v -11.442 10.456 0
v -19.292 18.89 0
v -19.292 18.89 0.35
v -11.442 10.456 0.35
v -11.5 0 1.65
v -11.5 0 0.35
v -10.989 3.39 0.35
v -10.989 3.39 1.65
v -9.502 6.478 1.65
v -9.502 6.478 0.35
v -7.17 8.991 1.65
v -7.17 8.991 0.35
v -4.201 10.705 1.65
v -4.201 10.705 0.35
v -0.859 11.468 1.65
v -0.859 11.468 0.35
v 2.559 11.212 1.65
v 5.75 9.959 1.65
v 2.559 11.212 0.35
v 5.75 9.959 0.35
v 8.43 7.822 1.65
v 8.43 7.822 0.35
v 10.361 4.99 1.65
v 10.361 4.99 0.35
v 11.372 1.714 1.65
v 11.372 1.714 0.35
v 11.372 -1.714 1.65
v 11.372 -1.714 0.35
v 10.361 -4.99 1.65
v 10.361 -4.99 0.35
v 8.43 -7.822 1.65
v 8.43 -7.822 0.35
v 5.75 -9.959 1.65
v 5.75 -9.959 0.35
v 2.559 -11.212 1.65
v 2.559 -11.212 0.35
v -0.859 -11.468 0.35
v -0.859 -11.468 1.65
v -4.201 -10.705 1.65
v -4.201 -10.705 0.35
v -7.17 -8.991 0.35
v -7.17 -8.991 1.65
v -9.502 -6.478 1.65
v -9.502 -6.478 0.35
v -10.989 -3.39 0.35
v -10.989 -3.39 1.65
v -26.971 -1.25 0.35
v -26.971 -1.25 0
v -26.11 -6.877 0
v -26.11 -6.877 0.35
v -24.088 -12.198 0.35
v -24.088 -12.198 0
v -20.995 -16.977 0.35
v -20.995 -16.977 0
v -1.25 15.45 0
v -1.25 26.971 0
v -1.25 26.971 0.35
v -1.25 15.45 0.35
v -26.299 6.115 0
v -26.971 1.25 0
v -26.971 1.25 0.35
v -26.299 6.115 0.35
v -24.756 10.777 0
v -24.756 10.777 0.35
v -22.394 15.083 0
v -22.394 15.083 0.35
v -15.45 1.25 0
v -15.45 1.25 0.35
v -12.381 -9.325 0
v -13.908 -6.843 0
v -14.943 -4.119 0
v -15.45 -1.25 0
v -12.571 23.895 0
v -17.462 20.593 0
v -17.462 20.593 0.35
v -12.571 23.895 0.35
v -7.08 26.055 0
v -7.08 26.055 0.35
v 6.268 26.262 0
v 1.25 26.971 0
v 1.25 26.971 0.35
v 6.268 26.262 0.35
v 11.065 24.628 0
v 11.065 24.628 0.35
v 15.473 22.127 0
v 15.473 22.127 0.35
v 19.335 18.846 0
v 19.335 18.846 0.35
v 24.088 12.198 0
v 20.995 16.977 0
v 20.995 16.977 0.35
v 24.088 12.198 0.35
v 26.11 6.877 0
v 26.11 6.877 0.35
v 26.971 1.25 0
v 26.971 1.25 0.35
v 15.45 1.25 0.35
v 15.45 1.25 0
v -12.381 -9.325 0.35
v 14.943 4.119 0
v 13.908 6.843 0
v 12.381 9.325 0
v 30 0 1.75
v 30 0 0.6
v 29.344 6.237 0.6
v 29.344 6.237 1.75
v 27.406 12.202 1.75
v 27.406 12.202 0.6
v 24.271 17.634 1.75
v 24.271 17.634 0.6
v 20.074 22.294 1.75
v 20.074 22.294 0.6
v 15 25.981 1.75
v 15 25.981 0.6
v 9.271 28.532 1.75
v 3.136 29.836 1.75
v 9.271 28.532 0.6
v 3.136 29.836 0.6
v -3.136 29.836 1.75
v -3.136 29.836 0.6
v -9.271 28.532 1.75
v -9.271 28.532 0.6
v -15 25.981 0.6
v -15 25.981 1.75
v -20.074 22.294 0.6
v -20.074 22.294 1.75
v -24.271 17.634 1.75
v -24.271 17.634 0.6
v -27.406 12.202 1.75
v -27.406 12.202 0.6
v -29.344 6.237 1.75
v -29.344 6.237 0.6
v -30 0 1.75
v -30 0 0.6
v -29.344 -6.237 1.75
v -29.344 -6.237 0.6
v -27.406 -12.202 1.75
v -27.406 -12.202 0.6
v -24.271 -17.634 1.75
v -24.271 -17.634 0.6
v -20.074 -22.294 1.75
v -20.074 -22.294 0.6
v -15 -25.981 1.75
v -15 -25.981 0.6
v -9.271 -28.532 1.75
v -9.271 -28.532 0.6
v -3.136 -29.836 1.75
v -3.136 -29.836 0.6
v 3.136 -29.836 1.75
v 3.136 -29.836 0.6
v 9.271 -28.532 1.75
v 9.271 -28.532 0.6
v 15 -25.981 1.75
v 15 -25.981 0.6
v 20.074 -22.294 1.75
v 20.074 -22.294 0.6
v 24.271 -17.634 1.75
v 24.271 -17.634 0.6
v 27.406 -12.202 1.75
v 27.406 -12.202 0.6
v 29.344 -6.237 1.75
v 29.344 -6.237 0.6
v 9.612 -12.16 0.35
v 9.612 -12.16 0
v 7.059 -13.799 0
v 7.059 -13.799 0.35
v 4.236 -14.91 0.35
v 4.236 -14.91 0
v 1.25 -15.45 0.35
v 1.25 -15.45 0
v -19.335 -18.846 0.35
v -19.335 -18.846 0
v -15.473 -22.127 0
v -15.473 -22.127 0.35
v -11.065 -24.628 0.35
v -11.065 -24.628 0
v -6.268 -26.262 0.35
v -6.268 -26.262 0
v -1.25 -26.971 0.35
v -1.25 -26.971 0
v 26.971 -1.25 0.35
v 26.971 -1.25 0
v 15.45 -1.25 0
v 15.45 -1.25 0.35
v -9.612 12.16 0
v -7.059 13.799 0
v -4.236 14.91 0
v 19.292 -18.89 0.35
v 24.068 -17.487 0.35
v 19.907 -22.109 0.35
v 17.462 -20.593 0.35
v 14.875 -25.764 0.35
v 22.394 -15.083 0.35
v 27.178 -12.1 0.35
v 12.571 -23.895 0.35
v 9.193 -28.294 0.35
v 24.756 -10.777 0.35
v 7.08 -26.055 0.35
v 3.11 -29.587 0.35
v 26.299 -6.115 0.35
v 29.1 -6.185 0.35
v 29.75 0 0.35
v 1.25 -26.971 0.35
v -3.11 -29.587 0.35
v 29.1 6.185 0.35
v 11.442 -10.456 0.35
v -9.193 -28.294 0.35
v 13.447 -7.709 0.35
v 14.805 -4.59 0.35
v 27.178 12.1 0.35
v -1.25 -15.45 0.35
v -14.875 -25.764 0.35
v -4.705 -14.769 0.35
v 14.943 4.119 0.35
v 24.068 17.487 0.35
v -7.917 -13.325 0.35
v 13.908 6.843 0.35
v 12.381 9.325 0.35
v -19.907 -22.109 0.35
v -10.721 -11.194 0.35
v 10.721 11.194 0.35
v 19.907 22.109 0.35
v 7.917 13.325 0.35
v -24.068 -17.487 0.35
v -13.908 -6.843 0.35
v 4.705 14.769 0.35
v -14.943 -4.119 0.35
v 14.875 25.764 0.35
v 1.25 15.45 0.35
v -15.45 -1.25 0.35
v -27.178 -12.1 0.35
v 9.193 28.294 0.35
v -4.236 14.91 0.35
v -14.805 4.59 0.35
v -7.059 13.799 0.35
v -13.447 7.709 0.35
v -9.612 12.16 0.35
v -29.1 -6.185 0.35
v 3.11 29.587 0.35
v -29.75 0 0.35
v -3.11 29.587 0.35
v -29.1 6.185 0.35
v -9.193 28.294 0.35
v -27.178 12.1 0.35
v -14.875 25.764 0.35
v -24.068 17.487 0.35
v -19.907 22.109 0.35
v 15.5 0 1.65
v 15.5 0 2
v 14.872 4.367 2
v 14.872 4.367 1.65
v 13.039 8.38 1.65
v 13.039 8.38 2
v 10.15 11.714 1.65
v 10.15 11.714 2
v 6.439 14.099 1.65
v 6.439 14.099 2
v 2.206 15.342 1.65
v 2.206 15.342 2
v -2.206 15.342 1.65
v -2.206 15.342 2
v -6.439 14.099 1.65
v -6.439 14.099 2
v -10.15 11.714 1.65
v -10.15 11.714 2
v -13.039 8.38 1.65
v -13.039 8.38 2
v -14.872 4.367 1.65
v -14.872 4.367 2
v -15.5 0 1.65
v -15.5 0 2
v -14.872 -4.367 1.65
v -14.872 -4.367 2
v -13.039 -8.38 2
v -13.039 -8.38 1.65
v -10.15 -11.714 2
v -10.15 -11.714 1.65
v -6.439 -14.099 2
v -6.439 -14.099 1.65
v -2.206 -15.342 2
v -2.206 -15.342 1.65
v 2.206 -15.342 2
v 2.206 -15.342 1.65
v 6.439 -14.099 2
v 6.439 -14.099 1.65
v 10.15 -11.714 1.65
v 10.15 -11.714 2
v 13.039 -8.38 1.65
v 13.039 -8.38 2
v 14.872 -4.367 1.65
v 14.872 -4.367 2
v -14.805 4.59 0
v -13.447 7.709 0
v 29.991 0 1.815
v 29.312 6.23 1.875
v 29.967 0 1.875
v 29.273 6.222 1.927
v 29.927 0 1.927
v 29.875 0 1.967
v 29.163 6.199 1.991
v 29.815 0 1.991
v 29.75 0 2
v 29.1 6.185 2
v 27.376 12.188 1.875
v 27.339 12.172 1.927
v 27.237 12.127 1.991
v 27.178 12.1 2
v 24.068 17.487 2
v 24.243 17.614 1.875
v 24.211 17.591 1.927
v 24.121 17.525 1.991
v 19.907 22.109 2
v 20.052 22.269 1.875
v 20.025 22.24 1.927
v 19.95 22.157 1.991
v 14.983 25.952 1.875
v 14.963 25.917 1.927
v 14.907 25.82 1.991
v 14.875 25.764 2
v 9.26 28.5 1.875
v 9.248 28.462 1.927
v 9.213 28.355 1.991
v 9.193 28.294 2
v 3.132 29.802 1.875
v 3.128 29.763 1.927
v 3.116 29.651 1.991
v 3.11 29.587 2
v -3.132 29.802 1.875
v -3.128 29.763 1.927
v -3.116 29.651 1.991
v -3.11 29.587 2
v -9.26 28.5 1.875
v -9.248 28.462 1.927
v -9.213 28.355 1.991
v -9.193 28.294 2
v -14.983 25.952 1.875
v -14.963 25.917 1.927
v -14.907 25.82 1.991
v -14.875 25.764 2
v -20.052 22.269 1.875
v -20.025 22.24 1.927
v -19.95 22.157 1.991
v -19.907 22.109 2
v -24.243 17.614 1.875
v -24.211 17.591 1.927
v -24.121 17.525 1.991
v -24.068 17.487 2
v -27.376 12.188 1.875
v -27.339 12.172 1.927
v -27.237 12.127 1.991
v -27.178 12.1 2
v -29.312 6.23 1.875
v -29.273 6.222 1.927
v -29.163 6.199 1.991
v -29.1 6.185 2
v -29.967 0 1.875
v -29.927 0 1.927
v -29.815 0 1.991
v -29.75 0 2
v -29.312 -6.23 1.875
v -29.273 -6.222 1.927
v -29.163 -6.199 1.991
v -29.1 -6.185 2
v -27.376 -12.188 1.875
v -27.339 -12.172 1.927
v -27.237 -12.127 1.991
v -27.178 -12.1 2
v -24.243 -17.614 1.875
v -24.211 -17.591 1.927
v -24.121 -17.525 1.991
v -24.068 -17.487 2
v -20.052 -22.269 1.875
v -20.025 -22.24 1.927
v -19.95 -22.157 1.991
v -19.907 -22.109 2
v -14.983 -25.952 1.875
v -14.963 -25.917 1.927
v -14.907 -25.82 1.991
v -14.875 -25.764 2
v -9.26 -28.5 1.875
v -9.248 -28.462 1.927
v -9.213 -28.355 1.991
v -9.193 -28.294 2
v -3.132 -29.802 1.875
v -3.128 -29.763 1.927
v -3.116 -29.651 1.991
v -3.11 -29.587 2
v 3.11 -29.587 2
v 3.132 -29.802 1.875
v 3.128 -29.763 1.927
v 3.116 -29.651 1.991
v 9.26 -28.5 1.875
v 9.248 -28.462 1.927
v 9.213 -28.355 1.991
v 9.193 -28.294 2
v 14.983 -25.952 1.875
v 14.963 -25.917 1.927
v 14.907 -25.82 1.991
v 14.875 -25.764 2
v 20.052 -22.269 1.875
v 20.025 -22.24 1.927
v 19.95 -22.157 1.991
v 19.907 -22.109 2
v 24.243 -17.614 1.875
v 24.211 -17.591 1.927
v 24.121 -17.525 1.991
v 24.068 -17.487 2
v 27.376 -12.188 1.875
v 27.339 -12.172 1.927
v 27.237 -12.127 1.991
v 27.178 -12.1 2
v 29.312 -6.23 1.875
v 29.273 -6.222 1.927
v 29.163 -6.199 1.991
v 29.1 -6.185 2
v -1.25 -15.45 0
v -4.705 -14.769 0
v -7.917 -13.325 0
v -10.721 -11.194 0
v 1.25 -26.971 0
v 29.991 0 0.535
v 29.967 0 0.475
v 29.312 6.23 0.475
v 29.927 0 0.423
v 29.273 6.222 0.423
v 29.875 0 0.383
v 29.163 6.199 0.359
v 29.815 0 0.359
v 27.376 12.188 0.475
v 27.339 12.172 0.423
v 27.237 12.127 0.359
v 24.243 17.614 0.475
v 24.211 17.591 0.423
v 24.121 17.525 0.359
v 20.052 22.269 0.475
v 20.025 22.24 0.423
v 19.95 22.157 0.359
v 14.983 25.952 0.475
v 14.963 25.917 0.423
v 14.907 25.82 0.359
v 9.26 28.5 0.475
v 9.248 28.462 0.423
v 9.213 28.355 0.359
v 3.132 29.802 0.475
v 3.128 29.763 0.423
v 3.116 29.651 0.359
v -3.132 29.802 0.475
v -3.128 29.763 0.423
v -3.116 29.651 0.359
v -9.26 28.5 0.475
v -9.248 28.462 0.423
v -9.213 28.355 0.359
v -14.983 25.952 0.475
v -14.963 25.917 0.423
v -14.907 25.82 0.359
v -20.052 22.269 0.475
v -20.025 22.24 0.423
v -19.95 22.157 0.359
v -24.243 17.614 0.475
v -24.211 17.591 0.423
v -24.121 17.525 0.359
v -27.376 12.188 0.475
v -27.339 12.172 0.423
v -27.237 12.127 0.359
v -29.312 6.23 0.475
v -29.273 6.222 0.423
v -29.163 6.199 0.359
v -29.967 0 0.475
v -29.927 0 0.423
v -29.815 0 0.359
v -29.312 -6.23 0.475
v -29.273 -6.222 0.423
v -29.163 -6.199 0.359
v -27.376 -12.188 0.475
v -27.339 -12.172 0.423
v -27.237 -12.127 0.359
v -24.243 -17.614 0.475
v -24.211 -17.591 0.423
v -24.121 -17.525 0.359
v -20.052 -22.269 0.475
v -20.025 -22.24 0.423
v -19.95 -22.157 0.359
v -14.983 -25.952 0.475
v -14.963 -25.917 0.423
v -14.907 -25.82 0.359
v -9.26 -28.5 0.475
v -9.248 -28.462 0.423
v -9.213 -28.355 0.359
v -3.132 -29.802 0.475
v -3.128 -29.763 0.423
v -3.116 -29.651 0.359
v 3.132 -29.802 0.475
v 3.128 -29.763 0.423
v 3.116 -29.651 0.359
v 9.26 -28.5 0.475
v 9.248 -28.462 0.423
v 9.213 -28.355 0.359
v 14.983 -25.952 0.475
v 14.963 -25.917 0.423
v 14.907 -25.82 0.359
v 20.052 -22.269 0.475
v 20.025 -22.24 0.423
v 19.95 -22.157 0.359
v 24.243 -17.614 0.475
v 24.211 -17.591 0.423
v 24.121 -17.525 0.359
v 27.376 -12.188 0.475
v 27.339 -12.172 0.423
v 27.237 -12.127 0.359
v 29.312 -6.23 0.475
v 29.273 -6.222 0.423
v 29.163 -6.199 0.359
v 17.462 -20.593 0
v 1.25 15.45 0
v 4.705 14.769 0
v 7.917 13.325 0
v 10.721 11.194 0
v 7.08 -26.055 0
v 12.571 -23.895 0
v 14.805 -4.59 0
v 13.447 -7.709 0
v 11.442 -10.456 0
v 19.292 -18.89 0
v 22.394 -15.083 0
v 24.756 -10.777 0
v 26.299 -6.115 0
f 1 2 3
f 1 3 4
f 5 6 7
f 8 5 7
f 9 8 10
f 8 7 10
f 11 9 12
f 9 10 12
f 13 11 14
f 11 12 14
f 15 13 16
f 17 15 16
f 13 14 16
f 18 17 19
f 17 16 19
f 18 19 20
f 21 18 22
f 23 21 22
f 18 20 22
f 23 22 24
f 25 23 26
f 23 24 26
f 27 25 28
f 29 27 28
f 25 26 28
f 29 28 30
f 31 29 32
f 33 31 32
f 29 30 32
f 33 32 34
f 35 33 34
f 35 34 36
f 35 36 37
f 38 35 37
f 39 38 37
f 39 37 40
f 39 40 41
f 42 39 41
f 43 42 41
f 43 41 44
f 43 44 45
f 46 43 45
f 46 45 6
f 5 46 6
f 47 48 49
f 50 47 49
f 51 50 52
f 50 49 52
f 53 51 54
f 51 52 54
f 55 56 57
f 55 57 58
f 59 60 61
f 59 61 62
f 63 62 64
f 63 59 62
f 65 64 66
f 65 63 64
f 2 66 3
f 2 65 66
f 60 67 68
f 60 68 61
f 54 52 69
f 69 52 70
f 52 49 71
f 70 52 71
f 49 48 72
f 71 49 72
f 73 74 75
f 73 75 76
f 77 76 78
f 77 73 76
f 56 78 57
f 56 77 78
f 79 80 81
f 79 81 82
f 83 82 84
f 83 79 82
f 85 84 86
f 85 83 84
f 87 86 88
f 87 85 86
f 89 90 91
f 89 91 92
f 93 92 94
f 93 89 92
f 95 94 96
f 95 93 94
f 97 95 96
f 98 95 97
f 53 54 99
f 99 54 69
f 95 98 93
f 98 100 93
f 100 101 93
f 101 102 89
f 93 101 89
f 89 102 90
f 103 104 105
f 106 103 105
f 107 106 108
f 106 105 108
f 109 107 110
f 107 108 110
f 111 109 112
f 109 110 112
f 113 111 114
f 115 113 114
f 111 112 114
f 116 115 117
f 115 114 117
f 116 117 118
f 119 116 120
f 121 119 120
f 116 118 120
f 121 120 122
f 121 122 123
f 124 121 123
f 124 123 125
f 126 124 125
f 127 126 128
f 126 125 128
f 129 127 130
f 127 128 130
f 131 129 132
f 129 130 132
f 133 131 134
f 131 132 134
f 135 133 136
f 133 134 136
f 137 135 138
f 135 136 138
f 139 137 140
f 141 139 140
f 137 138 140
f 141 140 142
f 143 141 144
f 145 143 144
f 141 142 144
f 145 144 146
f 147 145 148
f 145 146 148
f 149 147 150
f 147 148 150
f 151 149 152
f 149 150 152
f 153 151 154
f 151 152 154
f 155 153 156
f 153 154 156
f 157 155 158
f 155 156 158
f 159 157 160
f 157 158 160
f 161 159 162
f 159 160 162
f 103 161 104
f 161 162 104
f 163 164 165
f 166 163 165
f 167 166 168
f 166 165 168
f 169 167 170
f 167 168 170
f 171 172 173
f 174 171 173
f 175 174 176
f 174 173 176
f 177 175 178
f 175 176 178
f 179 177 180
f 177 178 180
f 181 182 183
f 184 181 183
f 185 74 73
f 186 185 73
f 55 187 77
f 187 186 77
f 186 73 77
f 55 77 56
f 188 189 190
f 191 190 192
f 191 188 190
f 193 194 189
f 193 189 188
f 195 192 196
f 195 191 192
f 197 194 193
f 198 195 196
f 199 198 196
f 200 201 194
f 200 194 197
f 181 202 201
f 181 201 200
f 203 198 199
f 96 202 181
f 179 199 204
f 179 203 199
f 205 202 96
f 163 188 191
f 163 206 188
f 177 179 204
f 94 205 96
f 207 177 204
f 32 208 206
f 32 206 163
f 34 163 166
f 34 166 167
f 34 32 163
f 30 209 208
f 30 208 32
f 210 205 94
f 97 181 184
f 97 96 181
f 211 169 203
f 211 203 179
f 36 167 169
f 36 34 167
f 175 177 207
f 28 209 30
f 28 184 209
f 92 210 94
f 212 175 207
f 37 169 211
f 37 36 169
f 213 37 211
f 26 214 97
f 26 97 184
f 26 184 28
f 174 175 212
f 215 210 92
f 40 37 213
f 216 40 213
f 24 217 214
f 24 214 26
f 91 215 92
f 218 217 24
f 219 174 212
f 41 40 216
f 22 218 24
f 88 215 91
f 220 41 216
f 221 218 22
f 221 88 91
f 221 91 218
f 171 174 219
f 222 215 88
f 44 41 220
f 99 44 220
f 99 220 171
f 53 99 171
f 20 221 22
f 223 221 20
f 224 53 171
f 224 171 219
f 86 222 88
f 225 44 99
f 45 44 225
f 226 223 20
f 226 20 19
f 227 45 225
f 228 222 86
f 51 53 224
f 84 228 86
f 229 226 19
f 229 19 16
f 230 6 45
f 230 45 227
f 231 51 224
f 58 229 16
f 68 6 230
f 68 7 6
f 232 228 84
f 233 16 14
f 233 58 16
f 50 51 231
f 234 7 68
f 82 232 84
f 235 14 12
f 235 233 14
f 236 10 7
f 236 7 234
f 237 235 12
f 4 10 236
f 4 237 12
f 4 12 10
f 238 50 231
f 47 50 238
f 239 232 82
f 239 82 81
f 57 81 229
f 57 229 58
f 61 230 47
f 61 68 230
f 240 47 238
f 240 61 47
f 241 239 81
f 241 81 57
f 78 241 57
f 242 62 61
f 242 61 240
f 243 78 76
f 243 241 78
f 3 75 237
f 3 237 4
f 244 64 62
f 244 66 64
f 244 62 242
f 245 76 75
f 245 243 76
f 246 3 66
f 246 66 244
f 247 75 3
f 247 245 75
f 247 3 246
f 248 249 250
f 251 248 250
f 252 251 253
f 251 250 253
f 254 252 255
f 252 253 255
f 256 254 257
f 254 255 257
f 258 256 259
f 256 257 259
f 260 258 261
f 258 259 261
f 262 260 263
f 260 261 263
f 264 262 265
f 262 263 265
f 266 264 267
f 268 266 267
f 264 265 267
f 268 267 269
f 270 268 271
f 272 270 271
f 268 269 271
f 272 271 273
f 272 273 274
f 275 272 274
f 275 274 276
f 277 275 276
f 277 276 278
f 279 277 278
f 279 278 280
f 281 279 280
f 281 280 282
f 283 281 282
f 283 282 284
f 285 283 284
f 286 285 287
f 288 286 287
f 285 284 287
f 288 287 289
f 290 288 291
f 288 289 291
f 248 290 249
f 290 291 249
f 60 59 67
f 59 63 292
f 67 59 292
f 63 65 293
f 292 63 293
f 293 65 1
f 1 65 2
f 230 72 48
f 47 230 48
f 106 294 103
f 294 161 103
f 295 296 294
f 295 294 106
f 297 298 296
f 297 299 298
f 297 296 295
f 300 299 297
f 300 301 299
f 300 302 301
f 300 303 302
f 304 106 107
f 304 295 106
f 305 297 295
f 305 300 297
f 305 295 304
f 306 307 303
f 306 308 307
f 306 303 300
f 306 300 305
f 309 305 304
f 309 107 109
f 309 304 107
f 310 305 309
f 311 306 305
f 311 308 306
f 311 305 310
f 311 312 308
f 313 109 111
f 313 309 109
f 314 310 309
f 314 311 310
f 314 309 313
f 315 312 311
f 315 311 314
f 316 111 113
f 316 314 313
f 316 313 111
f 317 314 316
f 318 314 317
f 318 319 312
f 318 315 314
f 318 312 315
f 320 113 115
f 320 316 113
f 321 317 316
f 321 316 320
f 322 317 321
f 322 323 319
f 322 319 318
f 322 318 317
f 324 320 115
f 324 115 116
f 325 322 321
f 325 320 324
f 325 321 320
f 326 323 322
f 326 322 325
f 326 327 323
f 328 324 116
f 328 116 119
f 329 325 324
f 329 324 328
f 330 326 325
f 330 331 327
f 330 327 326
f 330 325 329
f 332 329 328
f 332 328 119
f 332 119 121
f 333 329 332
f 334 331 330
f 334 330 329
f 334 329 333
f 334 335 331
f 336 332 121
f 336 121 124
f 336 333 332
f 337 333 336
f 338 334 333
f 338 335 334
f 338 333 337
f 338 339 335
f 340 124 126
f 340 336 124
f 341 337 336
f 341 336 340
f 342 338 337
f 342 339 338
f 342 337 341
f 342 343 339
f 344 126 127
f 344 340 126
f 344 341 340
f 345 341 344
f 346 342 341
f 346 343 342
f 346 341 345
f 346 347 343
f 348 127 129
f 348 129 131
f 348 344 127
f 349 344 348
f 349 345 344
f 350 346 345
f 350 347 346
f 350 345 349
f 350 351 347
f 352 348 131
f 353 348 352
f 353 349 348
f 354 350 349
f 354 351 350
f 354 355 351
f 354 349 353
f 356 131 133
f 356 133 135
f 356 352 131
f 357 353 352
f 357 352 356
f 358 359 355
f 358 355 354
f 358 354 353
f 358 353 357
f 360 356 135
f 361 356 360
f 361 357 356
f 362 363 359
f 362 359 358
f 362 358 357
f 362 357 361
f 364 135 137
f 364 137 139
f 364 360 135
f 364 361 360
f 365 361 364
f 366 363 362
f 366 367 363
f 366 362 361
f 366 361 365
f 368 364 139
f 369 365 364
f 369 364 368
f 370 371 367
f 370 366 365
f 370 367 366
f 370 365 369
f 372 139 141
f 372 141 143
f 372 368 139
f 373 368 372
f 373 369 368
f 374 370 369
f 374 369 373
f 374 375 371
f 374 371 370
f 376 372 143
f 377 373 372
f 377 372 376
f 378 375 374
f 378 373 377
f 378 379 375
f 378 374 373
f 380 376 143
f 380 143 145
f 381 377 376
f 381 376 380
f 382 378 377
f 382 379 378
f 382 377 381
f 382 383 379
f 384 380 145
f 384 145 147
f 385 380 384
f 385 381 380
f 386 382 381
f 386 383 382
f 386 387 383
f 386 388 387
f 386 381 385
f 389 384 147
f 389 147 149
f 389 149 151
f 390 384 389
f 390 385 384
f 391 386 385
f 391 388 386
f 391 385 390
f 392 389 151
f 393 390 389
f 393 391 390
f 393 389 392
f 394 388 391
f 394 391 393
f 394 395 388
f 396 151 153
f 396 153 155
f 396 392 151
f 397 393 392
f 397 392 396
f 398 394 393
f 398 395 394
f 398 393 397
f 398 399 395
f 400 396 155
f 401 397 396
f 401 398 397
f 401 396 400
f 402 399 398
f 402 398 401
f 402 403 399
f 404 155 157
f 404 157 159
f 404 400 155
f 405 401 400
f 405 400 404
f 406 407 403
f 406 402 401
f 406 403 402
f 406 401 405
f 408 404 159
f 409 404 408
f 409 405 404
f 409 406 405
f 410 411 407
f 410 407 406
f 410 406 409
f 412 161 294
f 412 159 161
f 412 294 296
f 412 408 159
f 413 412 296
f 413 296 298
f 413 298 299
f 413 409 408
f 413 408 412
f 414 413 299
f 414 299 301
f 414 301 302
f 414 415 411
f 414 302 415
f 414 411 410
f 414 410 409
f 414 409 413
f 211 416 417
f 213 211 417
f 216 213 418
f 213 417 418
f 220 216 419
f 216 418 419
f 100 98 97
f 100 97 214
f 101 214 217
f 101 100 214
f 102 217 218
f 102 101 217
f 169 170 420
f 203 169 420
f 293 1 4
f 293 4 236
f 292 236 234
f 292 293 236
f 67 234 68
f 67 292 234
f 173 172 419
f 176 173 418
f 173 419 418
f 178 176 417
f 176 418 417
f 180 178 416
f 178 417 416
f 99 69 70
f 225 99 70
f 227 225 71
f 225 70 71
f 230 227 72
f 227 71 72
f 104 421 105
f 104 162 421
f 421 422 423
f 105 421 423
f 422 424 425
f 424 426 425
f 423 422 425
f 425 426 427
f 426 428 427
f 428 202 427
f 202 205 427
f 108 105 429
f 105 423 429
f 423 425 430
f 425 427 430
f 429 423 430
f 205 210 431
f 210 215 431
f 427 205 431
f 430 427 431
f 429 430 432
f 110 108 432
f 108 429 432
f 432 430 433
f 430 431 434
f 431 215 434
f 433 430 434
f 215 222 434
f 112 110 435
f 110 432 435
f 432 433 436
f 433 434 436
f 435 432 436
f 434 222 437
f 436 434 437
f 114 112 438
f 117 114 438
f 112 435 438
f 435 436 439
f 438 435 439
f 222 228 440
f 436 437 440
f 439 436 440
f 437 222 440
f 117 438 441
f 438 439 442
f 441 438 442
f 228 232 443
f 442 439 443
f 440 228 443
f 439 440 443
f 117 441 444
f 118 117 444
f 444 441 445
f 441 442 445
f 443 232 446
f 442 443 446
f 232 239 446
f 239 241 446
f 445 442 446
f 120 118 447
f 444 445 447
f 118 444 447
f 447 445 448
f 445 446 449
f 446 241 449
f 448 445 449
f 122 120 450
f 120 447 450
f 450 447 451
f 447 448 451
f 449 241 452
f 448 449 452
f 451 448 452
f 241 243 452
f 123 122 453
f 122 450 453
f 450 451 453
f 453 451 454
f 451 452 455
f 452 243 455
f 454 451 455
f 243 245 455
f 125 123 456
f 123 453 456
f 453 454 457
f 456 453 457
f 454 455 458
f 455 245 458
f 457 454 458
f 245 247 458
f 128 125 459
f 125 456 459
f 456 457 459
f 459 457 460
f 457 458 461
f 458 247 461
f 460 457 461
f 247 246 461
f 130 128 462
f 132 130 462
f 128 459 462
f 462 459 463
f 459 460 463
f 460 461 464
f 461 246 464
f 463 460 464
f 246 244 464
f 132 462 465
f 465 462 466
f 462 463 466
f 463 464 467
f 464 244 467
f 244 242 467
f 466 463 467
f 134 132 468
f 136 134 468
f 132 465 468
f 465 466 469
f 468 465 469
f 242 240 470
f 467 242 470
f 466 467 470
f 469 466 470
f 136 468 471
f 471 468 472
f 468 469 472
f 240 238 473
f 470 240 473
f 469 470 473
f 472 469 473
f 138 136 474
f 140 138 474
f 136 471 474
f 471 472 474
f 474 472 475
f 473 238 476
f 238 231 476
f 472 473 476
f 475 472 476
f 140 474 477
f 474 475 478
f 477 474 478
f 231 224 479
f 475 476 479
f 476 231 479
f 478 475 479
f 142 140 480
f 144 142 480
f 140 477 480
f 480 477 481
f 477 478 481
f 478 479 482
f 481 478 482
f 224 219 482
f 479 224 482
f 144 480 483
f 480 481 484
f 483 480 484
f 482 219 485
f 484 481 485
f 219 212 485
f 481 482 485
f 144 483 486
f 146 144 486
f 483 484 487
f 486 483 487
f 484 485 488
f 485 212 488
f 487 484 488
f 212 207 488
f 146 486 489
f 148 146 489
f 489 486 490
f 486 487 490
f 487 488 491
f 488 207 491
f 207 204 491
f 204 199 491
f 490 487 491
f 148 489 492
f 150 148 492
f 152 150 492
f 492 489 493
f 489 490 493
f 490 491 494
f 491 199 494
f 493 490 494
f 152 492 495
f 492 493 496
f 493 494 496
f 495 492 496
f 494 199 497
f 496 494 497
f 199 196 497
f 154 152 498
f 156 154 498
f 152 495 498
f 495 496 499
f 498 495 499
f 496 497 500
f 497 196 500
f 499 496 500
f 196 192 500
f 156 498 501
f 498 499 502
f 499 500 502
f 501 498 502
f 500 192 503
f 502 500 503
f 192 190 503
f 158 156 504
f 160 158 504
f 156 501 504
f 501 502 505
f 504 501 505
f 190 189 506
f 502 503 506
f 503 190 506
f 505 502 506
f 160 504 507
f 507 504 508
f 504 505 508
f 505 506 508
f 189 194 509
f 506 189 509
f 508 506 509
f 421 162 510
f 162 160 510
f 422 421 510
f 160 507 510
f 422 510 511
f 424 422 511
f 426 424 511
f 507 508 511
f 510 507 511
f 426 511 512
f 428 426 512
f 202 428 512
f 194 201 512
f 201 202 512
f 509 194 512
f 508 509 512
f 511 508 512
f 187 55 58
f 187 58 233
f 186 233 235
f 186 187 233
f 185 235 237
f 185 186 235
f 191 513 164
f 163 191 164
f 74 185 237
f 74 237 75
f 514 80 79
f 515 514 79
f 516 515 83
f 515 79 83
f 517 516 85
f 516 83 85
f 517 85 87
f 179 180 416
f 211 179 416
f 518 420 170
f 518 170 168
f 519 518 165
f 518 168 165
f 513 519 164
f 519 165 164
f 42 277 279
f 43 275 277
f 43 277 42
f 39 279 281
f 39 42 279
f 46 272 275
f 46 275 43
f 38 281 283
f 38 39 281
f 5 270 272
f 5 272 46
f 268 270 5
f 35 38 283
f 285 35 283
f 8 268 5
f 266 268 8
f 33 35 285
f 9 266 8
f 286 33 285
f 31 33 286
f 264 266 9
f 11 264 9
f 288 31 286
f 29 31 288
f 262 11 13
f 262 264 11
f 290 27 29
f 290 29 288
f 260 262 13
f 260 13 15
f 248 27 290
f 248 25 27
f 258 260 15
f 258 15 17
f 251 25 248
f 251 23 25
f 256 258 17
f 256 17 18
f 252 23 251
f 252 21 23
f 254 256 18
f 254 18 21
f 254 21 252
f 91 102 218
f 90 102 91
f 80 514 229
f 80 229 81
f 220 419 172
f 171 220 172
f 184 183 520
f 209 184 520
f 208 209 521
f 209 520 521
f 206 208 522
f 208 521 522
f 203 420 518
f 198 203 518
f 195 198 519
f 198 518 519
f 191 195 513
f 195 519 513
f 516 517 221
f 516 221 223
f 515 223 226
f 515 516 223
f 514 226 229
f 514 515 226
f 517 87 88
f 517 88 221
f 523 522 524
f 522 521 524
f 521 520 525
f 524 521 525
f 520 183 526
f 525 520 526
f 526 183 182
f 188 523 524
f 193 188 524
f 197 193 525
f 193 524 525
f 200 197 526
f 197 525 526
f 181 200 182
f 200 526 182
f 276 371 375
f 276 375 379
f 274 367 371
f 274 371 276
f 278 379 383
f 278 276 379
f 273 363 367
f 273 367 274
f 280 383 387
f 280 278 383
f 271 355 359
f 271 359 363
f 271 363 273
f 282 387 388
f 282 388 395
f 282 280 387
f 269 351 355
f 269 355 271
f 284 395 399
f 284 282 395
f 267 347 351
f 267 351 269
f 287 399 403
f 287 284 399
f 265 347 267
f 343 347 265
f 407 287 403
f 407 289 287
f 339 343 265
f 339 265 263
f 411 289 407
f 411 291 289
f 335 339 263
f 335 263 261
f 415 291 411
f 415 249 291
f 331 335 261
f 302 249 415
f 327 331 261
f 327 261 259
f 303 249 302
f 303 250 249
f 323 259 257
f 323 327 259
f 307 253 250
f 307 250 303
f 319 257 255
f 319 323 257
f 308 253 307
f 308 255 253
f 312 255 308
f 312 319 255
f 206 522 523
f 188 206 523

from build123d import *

# Parameters (mm, degrees)
ESBO_O1_R                  = 30
RESSALTO_EXTRUS_O1_DEPTH   = 2
ESBO_O2_R                  = 30
ESBO_O2_R_2                = 11.5
CORTE_EXTRUS_O6_DEPTH      = 0.35
ESBO_O9_R                  = 11.5
CORTE_EXTRUS_O7_DEPTH      = 37
CORTE_EXTRUS_O7_DEPTH_BACK = 12.35
FILETE2_R                  = 0.25
ESBO_O10_R                 = 15.5
CORTE_EXTRUS_O8_DEPTH      = 0.35


with BuildPart() as part:
    # Esboço1 → Ressalto-extrusão1 (new body)
    with BuildSketch(Plane.XY):
        Circle(ESBO_O1_R)
    extrude(amount=RESSALTO_EXTRUS_O1_DEPTH)

    # Esboço2 → Corte-extrusão6 (cut)
    with BuildSketch(Plane(origin=(0, 0, 0), x_dir=(-1, 0, 0), z_dir=(0, 0, -1))):
        Circle(ESBO_O2_R)
        Circle(ESBO_O2_R_2, mode=Mode.SUBTRACT)
        with BuildLine():
            Line((-17.462157831, -20.593033868), (-9.611804273, -12.159902081))
            ThreePointArc((-9.611804273, -12.159902081), (-5.674511924, -14.423935469), (-1.25, -15.449514555))
            Line((-1.25, -15.449514555), (-1.25, -26.971049294))
            ThreePointArc((-1.25, -26.971049294), (-9.884633674, -25.125565011), (-17.462157831, -20.593033868))
        make_face(mode=Mode.SUBTRACT)
        with BuildLine():
            Line((1.25, -26.971049294), (1.25, -15.449514555))
            ThreePointArc((1.25, -15.449514555), (6.35222208, -14.138573996), (10.720700103, -11.194489238))
            Line((10.720700103, -11.194489238), (19.334766503, -18.845869687))
            ThreePointArc((19.334766503, -18.845869687), (11.065161043, -24.628483735), (1.25, -26.971049294))
        make_face(mode=Mode.SUBTRACT)
        with BuildLine():
            Line((-26.971049294, -1.25), (-15.449514555, -1.25))
            ThreePointArc((-15.449514555, -1.25), (-14.211748443, -6.186776721), (-11.441667216, -10.456493261))
            Line((-11.441667216, -10.456493261), (-19.292020774, -18.889625048))
            ThreePointArc((-19.292020774, -18.889625048), (-24.755948901, -10.7769659), (-26.971049294, -1.25))
        make_face(mode=Mode.SUBTRACT)
        with BuildLine():
            Line((-26.971049294, 1.25), (-15.449514555, 1.25))
            ThreePointArc((-15.449514555, 1.25), (-14.489180857, 5.50578224), (-12.380934748, 9.325366201))
            Line((-12.380934748, 9.325366201), (-20.995001147, 16.97674665))
            ThreePointArc((-20.995001147, 16.97674665), (-25.239218268, 9.590717451), (-26.971049294, 1.25))
        make_face(mode=Mode.SUBTRACT)
        with BuildLine():
            Line((20.995001147, -16.976746651), (12.380934747, -9.325366201))
            ThreePointArc((12.380934747, -9.325366201), (14.489180857, -5.50578224), (15.449514555, -1.25))
            Line((15.449514555, -1.25), (26.971049294, -1.25))
            ThreePointArc((26.971049294, -1.25), (25.239218268, -9.590717451), (20.995001147, -16.976746651))
        make_face(mode=Mode.SUBTRACT)
        with BuildLine():
            Line((15.449514555, 1.25), (26.971049294, 1.25))
            ThreePointArc((26.971049294, 1.25), (24.755948901, 10.776965901), (19.292020774, 18.889625048))
            Line((19.292020774, 18.889625048), (11.441667216, 10.456493261))
            ThreePointArc((11.441667216, 10.456493261), (14.211748443, 6.186776721), (15.449514555, 1.25))
        make_face(mode=Mode.SUBTRACT)
        with BuildLine():
            Line((9.611804273, 12.159902081), (17.462157831, 20.593033868))
            ThreePointArc((17.462157831, 20.593033868), (9.884633674, 25.125565011), (1.25, 26.971049294))
            Line((1.25, 26.971049294), (1.25, 15.449514555))
            ThreePointArc((1.25, 15.449514555), (5.674511924, 14.423935469), (9.611804273, 12.159902081))
        make_face(mode=Mode.SUBTRACT)
        with BuildLine():
            Line((-1.25, 15.449514555), (-1.25, 26.971049294))
            ThreePointArc((-1.25, 26.971049294), (-11.065161043, 24.628483735), (-19.334766503, 18.845869687))
            Line((-19.334766503, 18.845869687), (-10.720700104, 11.194489238))
            ThreePointArc((-10.720700104, 11.194489238), (-6.35222208, 14.138573996), (-1.25, 15.449514555))
        make_face(mode=Mode.SUBTRACT)
    extrude(amount=-CORTE_EXTRUS_O6_DEPTH, mode=Mode.SUBTRACT)

    # Esboço9 → Corte-extrusão7 (cut, two sides)
    with BuildSketch(Plane(origin=(0, 0, 0), x_dir=(-1, 0, 0), z_dir=(0, 0, -1))) as corte_extrus_o7_sk:
        Circle(ESBO_O9_R)
    extrude(amount=CORTE_EXTRUS_O7_DEPTH, mode=Mode.SUBTRACT)
    extrude(corte_extrus_o7_sk.sketch, amount=-CORTE_EXTRUS_O7_DEPTH_BACK, mode=Mode.SUBTRACT)

    # Filete2
    filete2_edges = [part.edges().sort_by_distance(p)[0] for p in [
        (-30, 0, 0.35),
        (-30, 0, 2),
    ]]
    fillet(filete2_edges, radius=FILETE2_R)

    # Esboço10 → Corte-extrusão8 (cut)
    with BuildSketch(Plane.XY.offset(2)):
        Circle(ESBO_O10_R)
    extrude(amount=-CORTE_EXTRUS_O8_DEPTH, mode=Mode.SUBTRACT)


solid = part.part
